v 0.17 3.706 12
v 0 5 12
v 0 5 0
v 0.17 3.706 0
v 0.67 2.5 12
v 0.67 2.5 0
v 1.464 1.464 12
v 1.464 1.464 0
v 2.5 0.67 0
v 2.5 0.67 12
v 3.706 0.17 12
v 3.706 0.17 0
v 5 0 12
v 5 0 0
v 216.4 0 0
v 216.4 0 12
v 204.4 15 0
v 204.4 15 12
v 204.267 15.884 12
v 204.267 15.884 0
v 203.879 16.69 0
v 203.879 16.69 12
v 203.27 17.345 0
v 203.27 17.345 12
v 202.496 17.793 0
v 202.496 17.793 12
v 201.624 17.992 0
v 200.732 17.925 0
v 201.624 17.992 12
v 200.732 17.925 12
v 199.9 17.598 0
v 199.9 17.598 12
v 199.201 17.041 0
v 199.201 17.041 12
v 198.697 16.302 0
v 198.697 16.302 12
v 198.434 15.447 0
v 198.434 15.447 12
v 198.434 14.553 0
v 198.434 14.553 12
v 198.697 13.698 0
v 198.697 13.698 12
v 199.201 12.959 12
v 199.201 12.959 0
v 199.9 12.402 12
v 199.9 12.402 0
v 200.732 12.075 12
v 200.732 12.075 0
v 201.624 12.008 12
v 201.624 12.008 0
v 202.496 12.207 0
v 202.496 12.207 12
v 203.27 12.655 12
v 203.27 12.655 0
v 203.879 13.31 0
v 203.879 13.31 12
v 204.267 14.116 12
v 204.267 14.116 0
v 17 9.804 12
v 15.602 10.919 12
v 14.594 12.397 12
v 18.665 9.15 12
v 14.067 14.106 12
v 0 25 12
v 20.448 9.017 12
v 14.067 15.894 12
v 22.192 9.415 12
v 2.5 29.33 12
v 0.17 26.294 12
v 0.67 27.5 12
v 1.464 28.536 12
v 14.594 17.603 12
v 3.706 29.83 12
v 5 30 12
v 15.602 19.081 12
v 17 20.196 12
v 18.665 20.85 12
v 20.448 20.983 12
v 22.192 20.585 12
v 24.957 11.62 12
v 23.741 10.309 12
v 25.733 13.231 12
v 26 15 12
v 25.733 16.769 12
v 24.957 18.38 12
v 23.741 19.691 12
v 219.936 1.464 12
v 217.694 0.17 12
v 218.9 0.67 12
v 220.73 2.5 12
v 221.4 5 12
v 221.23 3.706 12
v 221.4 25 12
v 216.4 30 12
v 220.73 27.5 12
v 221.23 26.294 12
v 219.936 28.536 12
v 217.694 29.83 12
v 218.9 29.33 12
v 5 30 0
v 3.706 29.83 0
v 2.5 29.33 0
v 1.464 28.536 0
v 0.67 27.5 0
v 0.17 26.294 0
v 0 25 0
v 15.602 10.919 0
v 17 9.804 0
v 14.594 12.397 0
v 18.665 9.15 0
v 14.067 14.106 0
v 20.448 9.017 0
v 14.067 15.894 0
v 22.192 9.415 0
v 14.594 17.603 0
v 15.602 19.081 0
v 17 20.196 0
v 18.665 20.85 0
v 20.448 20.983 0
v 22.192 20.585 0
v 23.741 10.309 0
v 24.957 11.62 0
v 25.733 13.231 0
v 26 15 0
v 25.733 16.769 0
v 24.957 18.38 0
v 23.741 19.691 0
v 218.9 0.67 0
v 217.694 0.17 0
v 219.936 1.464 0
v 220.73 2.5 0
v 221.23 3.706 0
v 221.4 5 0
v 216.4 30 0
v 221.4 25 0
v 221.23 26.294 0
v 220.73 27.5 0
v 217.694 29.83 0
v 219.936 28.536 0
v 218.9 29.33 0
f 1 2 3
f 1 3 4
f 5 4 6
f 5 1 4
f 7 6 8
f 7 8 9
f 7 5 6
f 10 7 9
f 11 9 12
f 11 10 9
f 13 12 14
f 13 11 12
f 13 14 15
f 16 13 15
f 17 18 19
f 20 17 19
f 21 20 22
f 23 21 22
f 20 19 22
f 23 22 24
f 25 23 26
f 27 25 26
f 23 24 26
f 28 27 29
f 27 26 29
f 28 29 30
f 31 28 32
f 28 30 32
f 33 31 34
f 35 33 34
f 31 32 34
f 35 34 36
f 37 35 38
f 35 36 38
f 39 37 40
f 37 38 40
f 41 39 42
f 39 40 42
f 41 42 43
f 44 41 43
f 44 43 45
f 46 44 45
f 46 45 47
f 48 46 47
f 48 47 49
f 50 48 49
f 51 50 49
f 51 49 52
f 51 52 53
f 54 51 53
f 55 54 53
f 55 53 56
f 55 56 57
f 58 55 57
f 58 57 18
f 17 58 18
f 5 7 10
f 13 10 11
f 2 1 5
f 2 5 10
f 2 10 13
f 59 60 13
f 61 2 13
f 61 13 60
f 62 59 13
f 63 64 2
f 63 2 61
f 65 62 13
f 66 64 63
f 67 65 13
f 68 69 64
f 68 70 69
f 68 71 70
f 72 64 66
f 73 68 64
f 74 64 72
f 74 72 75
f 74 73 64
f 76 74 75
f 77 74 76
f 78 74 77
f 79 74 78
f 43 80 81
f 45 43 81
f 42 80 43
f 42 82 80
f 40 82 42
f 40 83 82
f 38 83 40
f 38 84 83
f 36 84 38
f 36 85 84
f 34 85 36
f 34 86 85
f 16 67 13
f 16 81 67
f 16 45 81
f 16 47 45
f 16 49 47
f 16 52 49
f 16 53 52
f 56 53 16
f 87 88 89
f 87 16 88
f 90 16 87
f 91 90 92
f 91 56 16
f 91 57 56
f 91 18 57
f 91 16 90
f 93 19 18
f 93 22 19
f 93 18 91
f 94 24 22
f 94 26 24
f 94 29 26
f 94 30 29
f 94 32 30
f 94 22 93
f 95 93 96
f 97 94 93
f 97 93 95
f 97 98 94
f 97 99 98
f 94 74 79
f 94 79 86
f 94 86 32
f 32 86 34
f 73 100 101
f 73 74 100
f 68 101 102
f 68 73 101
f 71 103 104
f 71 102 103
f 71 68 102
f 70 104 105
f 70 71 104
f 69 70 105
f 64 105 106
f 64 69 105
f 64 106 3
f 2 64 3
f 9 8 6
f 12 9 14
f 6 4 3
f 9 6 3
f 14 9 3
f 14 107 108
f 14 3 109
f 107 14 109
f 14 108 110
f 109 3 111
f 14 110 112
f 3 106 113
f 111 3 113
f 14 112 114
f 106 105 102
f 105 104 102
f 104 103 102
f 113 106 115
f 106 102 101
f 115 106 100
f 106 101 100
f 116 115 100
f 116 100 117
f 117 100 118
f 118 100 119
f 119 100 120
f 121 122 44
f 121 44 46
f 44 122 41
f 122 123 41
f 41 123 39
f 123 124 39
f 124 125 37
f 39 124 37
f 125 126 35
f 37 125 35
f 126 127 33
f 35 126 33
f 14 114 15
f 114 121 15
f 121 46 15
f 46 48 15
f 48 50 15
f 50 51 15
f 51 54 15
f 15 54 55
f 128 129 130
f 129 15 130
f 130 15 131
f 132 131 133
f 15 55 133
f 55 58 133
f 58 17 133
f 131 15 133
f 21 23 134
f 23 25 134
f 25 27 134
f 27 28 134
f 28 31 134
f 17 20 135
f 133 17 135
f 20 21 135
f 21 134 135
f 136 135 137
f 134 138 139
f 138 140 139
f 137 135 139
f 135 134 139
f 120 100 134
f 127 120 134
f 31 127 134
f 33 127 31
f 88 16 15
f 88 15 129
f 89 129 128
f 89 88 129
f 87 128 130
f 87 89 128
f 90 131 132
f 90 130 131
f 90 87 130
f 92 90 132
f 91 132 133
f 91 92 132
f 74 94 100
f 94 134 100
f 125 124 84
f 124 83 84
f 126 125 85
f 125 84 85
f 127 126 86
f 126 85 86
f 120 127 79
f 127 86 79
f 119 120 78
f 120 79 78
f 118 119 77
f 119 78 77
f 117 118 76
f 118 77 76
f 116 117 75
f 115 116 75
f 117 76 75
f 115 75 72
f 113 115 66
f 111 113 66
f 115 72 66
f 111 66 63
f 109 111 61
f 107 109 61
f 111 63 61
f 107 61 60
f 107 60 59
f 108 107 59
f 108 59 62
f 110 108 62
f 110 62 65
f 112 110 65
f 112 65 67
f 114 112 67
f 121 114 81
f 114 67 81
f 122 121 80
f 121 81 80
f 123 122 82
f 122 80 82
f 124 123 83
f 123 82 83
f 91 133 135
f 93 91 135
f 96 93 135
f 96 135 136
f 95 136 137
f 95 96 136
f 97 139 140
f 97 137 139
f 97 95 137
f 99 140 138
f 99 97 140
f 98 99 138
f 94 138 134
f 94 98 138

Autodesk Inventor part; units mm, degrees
ref_plane "YZ Plane" through (0, 0, 0) normal (1, 0, 0) x (0, 1, 0)
ref_plane "XZ Plane" through (0, 0, 0) normal (0, 1, 0) x (-1, 0, 0)
ref_plane "XY Plane" through (0, 0, 0) normal (0, 0, 1) x (1, 0, 0)
sketch "Sketch1" plane through (0, 0, 0) normal (0, 0, 1) x (1, 0, 0)
  line L0 (0, 0) -> (221.4, 0)
  line L1 (221.4, 0) -> (221.4, 30)
  line L2 (221.4, 30) -> (0, 30)
  line L3 (0, 30) -> (0, 0)
  dimension "d0" = 221.4
  dimension "d1" = 30
extrude "Extrusion1" add sketch "Sketch1" along normal blind 12
fillet "Fillet1" radius 5 4 edges at (221.4, 30, 6) (221.4, 0, 6) (0, 0, 6) (0, 30, 6)
sketch "Sketch2" plane through (0, 0, 12) normal (0, 0, 1) x (1, 0, 0)
  line L0 (0, 25) -> (0, 5) projected
  line L1 (0, 15) -> (20, 15)
  circle A0 centre (20, 15) radius 6
  line L2 (5, 0) -> (216.4, 0) projected
  line L3 (110.7, 0) -> (110.7, 30)
  line L4 (216.4, 30) -> (5, 30) projected
  line L5 (221.4, 5) -> (221.4, 25) projected
  line L6 (221.4, 15) -> (201.4, 15)
  circle A1 centre (201.4, 15) radius 3
  point P0 (0, 0)
  dimension "d5" = 20
  dimension "d6" = 12
  dimension "d10" = 20
  dimension "d11" = 6
extrude "Extrusion2" cut sketch "Sketch2" against normal through all
ref_plane "Work Plane1" through (0, 0, 6) normal (0, 0, 1) x (1, 0, 0)
properties part number "Fourbar-Crank"
